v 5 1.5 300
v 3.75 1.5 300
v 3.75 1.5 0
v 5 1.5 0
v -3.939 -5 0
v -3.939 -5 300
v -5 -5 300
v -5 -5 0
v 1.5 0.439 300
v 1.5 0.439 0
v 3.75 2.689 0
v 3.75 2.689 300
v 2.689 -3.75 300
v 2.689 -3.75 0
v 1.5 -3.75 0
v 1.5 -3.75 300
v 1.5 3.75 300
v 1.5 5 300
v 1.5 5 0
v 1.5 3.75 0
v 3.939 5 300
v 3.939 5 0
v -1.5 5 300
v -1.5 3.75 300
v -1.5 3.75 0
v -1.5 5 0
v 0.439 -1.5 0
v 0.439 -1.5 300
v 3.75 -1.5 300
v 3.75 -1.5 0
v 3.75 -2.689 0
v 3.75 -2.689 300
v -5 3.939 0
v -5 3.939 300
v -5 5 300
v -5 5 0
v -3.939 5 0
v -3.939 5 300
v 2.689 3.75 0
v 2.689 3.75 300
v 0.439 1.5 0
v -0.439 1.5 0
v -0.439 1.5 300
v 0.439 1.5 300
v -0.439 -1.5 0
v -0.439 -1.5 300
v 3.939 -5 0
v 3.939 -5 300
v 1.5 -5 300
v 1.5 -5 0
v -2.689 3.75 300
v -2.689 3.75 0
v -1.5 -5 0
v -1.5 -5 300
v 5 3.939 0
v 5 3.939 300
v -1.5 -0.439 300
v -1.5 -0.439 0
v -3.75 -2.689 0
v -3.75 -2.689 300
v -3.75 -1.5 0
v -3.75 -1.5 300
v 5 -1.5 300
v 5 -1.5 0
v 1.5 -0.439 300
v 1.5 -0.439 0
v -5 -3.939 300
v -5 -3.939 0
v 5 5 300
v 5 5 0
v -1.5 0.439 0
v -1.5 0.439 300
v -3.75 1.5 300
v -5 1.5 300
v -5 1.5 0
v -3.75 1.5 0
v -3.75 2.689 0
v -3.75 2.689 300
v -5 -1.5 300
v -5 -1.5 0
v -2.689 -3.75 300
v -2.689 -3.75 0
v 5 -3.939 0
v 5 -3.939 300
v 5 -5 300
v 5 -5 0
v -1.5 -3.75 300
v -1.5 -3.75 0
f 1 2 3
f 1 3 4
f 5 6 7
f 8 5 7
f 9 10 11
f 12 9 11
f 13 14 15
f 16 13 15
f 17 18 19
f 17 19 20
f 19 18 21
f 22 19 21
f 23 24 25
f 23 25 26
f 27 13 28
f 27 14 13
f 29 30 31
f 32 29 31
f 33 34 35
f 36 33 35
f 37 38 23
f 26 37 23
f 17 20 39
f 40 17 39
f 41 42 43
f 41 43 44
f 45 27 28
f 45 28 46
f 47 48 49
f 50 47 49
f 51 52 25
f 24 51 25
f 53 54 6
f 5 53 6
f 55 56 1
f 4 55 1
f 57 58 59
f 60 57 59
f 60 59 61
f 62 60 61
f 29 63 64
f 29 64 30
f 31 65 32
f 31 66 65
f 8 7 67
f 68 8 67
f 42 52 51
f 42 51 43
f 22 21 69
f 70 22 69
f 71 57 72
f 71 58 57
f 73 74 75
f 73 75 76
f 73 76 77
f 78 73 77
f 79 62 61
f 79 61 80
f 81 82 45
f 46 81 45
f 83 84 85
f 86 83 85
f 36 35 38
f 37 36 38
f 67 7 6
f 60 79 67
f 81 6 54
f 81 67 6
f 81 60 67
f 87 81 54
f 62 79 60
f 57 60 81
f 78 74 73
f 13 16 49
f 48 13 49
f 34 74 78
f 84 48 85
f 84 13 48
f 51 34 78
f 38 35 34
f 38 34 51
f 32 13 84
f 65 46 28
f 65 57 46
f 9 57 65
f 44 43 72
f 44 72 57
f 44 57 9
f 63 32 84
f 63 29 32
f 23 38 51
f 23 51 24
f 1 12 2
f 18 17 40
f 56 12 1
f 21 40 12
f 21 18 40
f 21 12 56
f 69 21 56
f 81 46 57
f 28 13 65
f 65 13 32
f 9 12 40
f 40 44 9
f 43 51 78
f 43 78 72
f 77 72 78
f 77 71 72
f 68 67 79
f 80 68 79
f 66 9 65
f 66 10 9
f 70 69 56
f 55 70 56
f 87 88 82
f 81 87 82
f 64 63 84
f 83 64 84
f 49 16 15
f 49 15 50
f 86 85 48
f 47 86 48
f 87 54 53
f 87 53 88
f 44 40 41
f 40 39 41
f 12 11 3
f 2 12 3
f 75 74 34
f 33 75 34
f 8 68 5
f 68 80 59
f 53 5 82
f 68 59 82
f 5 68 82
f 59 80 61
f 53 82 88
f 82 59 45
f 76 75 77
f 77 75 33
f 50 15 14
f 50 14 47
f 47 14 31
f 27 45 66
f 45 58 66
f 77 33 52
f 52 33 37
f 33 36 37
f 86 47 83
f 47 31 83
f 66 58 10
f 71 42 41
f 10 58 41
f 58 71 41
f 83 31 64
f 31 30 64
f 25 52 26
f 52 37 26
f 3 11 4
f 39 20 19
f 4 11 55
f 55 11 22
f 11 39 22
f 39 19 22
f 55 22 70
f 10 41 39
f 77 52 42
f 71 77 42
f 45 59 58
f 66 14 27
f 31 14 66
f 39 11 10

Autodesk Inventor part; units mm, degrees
ref_plane "YZ Plane" through (0, 0, 0) normal (1, 0, 0) x (0, 1, 0)
ref_plane "XZ Plane" through (0, 0, 0) normal (0, 1, 0) x (-1, 0, 0)
ref_plane "XY Plane" through (0, 0, 0) normal (0, 0, 1) x (1, 0, 0)
sketch "Sketch1" plane through (0, 0, 0) normal (0, 0, 1) x (1, 0, 0)
  line L0 (-4.4697, -5.5303) -> (4.4697, 5.5303) construction
  line L1 (5.5303, 4.4697) -> (-5, -4.0411) construction
  line L2 (4.4697, -5.5303) -> (-4.4697, 5.5303) construction
  line L3 (-5.5303, 4.4697) -> (5.5303, -4.4697) construction
  line L4 (-5, -5) -> (-5, -3.9393)
  line L5 (-5, 3.9393) -> (-5, 5)
  line L6 (5, 5) -> (5, 3.9393)
  line L7 (5, -3.9393) -> (5, -5)
  line L8 (-5, 5) -> (-3.9393, 5)
  line L9 (3.9393, 5) -> (5, 5)
  line L10 (5, -5) -> (3.9393, -5)
  line L11 (-3.9393, -5) -> (-5, -5)
  line L12 (-2.6893, 3.75) -> (-0.4393, 1.5)
  line L13 (2.6893, 3.75) -> (0.4393, 1.5)
  line L14 (-1.5, -0.4393) -> (-3.75, -2.6893)
  line L15 (-1.5, 0.4393) -> (-3.75, 2.6893)
  line L16 (2.6893, -3.75) -> (0.4393, -1.5)
  line L17 (-2.6893, -3.75) -> (-0.4393, -1.5)
  line L18 (1.5, 0.4393) -> (3.75, 2.6893)
  line L19 (1.5, -0.4393) -> (3.75, -2.6893)
  line L20 (5, -5) -> (-5, 5) construction
  line L21 (-5, -5) -> (5, 5) construction
  line L22 (3.75, -3.75) -> (-3.75, 3.75) construction
  line L23 (-3.75, -3.75) -> (3.75, 3.75) construction
  line L24 (1.5, -5) -> (-1.5, 5) construction
  line L25 (-1.5, -5) -> (1.5, 5) construction
  line L26 (5, -1.5) -> (-5, 1.5) construction
  line L27 (-5, -1.5) -> (5, 1.5) construction
  line L28 (-5, 1.5) -> (-3.75, 1.5)
  line L29 (-3.75, -1.5) -> (-5, -1.5)
  line L30 (-3.75, -2.6893) -> (-3.75, -1.5)
  line L31 (-3.75, 1.5) -> (-3.75, 2.6893)
  line L32 (-5, -5) -> (-5, -1.5)
  line L33 (-5, 1.5) -> (-5, 5)
  line L34 (-5, 5) -> (-1.5, 5)
  line L35 (1.5, 5) -> (5, 5)
  line L36 (-1.5, 3.75) -> (-1.5, 5)
  line L37 (-2.6893, 3.75) -> (-1.5, 3.75)
  line L38 (1.5, 3.75) -> (2.6893, 3.75)
  line L39 (1.5, 5) -> (1.5, 3.75)
  line L40 (3.75, 1.5) -> (5, 1.5)
  line L41 (3.75, 2.6893) -> (3.75, 1.5)
  line L42 (3.75, -1.5) -> (3.75, -2.6893)
  line L43 (5, 5) -> (5, 1.5)
  line L44 (5, -1.5) -> (5, -5)
  line L45 (5, -1.5) -> (3.75, -1.5)
  line L46 (-0.45, 1.5) -> (0.45, 1.5)
  line L47 (-1.5, -5) -> (-1.5, -3.75)
  line L48 (-1.5, -0.45) -> (-1.5, 0.45)
  line L49 (1.5, 0.45) -> (1.5, -0.45)
  line L50 (2.6893, -3.75) -> (1.5, -3.75)
  line L51 (5, -5) -> (1.5, -5)
  line L52 (-1.5, -5) -> (-5, -5)
  line L53 (1.5, -3.75) -> (1.5, -5)
  line L54 (0.45, -1.5) -> (-0.45, -1.5)
  line L55 (-1.5, -3.75) -> (-2.6893, -3.75)
  point P0 (0, 0)
  point P1 (0, 0)
  dimension "d0" = 10
  dimension "d7" = 1.5
  dimension "d8" = 1.5
  dimension "d9" = 7.5
  dimension "d10" = 7.5
  dimension "d11" = 10
  dimension "d12" = 3
  dimension "d13" = 3
extrude "Extrusion1" add sketch "Sketch1" along normal blind 300
equation "\"d8\" = d7"
equation "\"d10\" = d9"
equation "\"d11\" = d0"
equation "\"d4\" = 0.5 * d0"
equation "\"d5\" = 0.5 * d0"
equation "\"d6\" = 0.5 * d0"
properties part number "maker-beam-300x10x10mm"
